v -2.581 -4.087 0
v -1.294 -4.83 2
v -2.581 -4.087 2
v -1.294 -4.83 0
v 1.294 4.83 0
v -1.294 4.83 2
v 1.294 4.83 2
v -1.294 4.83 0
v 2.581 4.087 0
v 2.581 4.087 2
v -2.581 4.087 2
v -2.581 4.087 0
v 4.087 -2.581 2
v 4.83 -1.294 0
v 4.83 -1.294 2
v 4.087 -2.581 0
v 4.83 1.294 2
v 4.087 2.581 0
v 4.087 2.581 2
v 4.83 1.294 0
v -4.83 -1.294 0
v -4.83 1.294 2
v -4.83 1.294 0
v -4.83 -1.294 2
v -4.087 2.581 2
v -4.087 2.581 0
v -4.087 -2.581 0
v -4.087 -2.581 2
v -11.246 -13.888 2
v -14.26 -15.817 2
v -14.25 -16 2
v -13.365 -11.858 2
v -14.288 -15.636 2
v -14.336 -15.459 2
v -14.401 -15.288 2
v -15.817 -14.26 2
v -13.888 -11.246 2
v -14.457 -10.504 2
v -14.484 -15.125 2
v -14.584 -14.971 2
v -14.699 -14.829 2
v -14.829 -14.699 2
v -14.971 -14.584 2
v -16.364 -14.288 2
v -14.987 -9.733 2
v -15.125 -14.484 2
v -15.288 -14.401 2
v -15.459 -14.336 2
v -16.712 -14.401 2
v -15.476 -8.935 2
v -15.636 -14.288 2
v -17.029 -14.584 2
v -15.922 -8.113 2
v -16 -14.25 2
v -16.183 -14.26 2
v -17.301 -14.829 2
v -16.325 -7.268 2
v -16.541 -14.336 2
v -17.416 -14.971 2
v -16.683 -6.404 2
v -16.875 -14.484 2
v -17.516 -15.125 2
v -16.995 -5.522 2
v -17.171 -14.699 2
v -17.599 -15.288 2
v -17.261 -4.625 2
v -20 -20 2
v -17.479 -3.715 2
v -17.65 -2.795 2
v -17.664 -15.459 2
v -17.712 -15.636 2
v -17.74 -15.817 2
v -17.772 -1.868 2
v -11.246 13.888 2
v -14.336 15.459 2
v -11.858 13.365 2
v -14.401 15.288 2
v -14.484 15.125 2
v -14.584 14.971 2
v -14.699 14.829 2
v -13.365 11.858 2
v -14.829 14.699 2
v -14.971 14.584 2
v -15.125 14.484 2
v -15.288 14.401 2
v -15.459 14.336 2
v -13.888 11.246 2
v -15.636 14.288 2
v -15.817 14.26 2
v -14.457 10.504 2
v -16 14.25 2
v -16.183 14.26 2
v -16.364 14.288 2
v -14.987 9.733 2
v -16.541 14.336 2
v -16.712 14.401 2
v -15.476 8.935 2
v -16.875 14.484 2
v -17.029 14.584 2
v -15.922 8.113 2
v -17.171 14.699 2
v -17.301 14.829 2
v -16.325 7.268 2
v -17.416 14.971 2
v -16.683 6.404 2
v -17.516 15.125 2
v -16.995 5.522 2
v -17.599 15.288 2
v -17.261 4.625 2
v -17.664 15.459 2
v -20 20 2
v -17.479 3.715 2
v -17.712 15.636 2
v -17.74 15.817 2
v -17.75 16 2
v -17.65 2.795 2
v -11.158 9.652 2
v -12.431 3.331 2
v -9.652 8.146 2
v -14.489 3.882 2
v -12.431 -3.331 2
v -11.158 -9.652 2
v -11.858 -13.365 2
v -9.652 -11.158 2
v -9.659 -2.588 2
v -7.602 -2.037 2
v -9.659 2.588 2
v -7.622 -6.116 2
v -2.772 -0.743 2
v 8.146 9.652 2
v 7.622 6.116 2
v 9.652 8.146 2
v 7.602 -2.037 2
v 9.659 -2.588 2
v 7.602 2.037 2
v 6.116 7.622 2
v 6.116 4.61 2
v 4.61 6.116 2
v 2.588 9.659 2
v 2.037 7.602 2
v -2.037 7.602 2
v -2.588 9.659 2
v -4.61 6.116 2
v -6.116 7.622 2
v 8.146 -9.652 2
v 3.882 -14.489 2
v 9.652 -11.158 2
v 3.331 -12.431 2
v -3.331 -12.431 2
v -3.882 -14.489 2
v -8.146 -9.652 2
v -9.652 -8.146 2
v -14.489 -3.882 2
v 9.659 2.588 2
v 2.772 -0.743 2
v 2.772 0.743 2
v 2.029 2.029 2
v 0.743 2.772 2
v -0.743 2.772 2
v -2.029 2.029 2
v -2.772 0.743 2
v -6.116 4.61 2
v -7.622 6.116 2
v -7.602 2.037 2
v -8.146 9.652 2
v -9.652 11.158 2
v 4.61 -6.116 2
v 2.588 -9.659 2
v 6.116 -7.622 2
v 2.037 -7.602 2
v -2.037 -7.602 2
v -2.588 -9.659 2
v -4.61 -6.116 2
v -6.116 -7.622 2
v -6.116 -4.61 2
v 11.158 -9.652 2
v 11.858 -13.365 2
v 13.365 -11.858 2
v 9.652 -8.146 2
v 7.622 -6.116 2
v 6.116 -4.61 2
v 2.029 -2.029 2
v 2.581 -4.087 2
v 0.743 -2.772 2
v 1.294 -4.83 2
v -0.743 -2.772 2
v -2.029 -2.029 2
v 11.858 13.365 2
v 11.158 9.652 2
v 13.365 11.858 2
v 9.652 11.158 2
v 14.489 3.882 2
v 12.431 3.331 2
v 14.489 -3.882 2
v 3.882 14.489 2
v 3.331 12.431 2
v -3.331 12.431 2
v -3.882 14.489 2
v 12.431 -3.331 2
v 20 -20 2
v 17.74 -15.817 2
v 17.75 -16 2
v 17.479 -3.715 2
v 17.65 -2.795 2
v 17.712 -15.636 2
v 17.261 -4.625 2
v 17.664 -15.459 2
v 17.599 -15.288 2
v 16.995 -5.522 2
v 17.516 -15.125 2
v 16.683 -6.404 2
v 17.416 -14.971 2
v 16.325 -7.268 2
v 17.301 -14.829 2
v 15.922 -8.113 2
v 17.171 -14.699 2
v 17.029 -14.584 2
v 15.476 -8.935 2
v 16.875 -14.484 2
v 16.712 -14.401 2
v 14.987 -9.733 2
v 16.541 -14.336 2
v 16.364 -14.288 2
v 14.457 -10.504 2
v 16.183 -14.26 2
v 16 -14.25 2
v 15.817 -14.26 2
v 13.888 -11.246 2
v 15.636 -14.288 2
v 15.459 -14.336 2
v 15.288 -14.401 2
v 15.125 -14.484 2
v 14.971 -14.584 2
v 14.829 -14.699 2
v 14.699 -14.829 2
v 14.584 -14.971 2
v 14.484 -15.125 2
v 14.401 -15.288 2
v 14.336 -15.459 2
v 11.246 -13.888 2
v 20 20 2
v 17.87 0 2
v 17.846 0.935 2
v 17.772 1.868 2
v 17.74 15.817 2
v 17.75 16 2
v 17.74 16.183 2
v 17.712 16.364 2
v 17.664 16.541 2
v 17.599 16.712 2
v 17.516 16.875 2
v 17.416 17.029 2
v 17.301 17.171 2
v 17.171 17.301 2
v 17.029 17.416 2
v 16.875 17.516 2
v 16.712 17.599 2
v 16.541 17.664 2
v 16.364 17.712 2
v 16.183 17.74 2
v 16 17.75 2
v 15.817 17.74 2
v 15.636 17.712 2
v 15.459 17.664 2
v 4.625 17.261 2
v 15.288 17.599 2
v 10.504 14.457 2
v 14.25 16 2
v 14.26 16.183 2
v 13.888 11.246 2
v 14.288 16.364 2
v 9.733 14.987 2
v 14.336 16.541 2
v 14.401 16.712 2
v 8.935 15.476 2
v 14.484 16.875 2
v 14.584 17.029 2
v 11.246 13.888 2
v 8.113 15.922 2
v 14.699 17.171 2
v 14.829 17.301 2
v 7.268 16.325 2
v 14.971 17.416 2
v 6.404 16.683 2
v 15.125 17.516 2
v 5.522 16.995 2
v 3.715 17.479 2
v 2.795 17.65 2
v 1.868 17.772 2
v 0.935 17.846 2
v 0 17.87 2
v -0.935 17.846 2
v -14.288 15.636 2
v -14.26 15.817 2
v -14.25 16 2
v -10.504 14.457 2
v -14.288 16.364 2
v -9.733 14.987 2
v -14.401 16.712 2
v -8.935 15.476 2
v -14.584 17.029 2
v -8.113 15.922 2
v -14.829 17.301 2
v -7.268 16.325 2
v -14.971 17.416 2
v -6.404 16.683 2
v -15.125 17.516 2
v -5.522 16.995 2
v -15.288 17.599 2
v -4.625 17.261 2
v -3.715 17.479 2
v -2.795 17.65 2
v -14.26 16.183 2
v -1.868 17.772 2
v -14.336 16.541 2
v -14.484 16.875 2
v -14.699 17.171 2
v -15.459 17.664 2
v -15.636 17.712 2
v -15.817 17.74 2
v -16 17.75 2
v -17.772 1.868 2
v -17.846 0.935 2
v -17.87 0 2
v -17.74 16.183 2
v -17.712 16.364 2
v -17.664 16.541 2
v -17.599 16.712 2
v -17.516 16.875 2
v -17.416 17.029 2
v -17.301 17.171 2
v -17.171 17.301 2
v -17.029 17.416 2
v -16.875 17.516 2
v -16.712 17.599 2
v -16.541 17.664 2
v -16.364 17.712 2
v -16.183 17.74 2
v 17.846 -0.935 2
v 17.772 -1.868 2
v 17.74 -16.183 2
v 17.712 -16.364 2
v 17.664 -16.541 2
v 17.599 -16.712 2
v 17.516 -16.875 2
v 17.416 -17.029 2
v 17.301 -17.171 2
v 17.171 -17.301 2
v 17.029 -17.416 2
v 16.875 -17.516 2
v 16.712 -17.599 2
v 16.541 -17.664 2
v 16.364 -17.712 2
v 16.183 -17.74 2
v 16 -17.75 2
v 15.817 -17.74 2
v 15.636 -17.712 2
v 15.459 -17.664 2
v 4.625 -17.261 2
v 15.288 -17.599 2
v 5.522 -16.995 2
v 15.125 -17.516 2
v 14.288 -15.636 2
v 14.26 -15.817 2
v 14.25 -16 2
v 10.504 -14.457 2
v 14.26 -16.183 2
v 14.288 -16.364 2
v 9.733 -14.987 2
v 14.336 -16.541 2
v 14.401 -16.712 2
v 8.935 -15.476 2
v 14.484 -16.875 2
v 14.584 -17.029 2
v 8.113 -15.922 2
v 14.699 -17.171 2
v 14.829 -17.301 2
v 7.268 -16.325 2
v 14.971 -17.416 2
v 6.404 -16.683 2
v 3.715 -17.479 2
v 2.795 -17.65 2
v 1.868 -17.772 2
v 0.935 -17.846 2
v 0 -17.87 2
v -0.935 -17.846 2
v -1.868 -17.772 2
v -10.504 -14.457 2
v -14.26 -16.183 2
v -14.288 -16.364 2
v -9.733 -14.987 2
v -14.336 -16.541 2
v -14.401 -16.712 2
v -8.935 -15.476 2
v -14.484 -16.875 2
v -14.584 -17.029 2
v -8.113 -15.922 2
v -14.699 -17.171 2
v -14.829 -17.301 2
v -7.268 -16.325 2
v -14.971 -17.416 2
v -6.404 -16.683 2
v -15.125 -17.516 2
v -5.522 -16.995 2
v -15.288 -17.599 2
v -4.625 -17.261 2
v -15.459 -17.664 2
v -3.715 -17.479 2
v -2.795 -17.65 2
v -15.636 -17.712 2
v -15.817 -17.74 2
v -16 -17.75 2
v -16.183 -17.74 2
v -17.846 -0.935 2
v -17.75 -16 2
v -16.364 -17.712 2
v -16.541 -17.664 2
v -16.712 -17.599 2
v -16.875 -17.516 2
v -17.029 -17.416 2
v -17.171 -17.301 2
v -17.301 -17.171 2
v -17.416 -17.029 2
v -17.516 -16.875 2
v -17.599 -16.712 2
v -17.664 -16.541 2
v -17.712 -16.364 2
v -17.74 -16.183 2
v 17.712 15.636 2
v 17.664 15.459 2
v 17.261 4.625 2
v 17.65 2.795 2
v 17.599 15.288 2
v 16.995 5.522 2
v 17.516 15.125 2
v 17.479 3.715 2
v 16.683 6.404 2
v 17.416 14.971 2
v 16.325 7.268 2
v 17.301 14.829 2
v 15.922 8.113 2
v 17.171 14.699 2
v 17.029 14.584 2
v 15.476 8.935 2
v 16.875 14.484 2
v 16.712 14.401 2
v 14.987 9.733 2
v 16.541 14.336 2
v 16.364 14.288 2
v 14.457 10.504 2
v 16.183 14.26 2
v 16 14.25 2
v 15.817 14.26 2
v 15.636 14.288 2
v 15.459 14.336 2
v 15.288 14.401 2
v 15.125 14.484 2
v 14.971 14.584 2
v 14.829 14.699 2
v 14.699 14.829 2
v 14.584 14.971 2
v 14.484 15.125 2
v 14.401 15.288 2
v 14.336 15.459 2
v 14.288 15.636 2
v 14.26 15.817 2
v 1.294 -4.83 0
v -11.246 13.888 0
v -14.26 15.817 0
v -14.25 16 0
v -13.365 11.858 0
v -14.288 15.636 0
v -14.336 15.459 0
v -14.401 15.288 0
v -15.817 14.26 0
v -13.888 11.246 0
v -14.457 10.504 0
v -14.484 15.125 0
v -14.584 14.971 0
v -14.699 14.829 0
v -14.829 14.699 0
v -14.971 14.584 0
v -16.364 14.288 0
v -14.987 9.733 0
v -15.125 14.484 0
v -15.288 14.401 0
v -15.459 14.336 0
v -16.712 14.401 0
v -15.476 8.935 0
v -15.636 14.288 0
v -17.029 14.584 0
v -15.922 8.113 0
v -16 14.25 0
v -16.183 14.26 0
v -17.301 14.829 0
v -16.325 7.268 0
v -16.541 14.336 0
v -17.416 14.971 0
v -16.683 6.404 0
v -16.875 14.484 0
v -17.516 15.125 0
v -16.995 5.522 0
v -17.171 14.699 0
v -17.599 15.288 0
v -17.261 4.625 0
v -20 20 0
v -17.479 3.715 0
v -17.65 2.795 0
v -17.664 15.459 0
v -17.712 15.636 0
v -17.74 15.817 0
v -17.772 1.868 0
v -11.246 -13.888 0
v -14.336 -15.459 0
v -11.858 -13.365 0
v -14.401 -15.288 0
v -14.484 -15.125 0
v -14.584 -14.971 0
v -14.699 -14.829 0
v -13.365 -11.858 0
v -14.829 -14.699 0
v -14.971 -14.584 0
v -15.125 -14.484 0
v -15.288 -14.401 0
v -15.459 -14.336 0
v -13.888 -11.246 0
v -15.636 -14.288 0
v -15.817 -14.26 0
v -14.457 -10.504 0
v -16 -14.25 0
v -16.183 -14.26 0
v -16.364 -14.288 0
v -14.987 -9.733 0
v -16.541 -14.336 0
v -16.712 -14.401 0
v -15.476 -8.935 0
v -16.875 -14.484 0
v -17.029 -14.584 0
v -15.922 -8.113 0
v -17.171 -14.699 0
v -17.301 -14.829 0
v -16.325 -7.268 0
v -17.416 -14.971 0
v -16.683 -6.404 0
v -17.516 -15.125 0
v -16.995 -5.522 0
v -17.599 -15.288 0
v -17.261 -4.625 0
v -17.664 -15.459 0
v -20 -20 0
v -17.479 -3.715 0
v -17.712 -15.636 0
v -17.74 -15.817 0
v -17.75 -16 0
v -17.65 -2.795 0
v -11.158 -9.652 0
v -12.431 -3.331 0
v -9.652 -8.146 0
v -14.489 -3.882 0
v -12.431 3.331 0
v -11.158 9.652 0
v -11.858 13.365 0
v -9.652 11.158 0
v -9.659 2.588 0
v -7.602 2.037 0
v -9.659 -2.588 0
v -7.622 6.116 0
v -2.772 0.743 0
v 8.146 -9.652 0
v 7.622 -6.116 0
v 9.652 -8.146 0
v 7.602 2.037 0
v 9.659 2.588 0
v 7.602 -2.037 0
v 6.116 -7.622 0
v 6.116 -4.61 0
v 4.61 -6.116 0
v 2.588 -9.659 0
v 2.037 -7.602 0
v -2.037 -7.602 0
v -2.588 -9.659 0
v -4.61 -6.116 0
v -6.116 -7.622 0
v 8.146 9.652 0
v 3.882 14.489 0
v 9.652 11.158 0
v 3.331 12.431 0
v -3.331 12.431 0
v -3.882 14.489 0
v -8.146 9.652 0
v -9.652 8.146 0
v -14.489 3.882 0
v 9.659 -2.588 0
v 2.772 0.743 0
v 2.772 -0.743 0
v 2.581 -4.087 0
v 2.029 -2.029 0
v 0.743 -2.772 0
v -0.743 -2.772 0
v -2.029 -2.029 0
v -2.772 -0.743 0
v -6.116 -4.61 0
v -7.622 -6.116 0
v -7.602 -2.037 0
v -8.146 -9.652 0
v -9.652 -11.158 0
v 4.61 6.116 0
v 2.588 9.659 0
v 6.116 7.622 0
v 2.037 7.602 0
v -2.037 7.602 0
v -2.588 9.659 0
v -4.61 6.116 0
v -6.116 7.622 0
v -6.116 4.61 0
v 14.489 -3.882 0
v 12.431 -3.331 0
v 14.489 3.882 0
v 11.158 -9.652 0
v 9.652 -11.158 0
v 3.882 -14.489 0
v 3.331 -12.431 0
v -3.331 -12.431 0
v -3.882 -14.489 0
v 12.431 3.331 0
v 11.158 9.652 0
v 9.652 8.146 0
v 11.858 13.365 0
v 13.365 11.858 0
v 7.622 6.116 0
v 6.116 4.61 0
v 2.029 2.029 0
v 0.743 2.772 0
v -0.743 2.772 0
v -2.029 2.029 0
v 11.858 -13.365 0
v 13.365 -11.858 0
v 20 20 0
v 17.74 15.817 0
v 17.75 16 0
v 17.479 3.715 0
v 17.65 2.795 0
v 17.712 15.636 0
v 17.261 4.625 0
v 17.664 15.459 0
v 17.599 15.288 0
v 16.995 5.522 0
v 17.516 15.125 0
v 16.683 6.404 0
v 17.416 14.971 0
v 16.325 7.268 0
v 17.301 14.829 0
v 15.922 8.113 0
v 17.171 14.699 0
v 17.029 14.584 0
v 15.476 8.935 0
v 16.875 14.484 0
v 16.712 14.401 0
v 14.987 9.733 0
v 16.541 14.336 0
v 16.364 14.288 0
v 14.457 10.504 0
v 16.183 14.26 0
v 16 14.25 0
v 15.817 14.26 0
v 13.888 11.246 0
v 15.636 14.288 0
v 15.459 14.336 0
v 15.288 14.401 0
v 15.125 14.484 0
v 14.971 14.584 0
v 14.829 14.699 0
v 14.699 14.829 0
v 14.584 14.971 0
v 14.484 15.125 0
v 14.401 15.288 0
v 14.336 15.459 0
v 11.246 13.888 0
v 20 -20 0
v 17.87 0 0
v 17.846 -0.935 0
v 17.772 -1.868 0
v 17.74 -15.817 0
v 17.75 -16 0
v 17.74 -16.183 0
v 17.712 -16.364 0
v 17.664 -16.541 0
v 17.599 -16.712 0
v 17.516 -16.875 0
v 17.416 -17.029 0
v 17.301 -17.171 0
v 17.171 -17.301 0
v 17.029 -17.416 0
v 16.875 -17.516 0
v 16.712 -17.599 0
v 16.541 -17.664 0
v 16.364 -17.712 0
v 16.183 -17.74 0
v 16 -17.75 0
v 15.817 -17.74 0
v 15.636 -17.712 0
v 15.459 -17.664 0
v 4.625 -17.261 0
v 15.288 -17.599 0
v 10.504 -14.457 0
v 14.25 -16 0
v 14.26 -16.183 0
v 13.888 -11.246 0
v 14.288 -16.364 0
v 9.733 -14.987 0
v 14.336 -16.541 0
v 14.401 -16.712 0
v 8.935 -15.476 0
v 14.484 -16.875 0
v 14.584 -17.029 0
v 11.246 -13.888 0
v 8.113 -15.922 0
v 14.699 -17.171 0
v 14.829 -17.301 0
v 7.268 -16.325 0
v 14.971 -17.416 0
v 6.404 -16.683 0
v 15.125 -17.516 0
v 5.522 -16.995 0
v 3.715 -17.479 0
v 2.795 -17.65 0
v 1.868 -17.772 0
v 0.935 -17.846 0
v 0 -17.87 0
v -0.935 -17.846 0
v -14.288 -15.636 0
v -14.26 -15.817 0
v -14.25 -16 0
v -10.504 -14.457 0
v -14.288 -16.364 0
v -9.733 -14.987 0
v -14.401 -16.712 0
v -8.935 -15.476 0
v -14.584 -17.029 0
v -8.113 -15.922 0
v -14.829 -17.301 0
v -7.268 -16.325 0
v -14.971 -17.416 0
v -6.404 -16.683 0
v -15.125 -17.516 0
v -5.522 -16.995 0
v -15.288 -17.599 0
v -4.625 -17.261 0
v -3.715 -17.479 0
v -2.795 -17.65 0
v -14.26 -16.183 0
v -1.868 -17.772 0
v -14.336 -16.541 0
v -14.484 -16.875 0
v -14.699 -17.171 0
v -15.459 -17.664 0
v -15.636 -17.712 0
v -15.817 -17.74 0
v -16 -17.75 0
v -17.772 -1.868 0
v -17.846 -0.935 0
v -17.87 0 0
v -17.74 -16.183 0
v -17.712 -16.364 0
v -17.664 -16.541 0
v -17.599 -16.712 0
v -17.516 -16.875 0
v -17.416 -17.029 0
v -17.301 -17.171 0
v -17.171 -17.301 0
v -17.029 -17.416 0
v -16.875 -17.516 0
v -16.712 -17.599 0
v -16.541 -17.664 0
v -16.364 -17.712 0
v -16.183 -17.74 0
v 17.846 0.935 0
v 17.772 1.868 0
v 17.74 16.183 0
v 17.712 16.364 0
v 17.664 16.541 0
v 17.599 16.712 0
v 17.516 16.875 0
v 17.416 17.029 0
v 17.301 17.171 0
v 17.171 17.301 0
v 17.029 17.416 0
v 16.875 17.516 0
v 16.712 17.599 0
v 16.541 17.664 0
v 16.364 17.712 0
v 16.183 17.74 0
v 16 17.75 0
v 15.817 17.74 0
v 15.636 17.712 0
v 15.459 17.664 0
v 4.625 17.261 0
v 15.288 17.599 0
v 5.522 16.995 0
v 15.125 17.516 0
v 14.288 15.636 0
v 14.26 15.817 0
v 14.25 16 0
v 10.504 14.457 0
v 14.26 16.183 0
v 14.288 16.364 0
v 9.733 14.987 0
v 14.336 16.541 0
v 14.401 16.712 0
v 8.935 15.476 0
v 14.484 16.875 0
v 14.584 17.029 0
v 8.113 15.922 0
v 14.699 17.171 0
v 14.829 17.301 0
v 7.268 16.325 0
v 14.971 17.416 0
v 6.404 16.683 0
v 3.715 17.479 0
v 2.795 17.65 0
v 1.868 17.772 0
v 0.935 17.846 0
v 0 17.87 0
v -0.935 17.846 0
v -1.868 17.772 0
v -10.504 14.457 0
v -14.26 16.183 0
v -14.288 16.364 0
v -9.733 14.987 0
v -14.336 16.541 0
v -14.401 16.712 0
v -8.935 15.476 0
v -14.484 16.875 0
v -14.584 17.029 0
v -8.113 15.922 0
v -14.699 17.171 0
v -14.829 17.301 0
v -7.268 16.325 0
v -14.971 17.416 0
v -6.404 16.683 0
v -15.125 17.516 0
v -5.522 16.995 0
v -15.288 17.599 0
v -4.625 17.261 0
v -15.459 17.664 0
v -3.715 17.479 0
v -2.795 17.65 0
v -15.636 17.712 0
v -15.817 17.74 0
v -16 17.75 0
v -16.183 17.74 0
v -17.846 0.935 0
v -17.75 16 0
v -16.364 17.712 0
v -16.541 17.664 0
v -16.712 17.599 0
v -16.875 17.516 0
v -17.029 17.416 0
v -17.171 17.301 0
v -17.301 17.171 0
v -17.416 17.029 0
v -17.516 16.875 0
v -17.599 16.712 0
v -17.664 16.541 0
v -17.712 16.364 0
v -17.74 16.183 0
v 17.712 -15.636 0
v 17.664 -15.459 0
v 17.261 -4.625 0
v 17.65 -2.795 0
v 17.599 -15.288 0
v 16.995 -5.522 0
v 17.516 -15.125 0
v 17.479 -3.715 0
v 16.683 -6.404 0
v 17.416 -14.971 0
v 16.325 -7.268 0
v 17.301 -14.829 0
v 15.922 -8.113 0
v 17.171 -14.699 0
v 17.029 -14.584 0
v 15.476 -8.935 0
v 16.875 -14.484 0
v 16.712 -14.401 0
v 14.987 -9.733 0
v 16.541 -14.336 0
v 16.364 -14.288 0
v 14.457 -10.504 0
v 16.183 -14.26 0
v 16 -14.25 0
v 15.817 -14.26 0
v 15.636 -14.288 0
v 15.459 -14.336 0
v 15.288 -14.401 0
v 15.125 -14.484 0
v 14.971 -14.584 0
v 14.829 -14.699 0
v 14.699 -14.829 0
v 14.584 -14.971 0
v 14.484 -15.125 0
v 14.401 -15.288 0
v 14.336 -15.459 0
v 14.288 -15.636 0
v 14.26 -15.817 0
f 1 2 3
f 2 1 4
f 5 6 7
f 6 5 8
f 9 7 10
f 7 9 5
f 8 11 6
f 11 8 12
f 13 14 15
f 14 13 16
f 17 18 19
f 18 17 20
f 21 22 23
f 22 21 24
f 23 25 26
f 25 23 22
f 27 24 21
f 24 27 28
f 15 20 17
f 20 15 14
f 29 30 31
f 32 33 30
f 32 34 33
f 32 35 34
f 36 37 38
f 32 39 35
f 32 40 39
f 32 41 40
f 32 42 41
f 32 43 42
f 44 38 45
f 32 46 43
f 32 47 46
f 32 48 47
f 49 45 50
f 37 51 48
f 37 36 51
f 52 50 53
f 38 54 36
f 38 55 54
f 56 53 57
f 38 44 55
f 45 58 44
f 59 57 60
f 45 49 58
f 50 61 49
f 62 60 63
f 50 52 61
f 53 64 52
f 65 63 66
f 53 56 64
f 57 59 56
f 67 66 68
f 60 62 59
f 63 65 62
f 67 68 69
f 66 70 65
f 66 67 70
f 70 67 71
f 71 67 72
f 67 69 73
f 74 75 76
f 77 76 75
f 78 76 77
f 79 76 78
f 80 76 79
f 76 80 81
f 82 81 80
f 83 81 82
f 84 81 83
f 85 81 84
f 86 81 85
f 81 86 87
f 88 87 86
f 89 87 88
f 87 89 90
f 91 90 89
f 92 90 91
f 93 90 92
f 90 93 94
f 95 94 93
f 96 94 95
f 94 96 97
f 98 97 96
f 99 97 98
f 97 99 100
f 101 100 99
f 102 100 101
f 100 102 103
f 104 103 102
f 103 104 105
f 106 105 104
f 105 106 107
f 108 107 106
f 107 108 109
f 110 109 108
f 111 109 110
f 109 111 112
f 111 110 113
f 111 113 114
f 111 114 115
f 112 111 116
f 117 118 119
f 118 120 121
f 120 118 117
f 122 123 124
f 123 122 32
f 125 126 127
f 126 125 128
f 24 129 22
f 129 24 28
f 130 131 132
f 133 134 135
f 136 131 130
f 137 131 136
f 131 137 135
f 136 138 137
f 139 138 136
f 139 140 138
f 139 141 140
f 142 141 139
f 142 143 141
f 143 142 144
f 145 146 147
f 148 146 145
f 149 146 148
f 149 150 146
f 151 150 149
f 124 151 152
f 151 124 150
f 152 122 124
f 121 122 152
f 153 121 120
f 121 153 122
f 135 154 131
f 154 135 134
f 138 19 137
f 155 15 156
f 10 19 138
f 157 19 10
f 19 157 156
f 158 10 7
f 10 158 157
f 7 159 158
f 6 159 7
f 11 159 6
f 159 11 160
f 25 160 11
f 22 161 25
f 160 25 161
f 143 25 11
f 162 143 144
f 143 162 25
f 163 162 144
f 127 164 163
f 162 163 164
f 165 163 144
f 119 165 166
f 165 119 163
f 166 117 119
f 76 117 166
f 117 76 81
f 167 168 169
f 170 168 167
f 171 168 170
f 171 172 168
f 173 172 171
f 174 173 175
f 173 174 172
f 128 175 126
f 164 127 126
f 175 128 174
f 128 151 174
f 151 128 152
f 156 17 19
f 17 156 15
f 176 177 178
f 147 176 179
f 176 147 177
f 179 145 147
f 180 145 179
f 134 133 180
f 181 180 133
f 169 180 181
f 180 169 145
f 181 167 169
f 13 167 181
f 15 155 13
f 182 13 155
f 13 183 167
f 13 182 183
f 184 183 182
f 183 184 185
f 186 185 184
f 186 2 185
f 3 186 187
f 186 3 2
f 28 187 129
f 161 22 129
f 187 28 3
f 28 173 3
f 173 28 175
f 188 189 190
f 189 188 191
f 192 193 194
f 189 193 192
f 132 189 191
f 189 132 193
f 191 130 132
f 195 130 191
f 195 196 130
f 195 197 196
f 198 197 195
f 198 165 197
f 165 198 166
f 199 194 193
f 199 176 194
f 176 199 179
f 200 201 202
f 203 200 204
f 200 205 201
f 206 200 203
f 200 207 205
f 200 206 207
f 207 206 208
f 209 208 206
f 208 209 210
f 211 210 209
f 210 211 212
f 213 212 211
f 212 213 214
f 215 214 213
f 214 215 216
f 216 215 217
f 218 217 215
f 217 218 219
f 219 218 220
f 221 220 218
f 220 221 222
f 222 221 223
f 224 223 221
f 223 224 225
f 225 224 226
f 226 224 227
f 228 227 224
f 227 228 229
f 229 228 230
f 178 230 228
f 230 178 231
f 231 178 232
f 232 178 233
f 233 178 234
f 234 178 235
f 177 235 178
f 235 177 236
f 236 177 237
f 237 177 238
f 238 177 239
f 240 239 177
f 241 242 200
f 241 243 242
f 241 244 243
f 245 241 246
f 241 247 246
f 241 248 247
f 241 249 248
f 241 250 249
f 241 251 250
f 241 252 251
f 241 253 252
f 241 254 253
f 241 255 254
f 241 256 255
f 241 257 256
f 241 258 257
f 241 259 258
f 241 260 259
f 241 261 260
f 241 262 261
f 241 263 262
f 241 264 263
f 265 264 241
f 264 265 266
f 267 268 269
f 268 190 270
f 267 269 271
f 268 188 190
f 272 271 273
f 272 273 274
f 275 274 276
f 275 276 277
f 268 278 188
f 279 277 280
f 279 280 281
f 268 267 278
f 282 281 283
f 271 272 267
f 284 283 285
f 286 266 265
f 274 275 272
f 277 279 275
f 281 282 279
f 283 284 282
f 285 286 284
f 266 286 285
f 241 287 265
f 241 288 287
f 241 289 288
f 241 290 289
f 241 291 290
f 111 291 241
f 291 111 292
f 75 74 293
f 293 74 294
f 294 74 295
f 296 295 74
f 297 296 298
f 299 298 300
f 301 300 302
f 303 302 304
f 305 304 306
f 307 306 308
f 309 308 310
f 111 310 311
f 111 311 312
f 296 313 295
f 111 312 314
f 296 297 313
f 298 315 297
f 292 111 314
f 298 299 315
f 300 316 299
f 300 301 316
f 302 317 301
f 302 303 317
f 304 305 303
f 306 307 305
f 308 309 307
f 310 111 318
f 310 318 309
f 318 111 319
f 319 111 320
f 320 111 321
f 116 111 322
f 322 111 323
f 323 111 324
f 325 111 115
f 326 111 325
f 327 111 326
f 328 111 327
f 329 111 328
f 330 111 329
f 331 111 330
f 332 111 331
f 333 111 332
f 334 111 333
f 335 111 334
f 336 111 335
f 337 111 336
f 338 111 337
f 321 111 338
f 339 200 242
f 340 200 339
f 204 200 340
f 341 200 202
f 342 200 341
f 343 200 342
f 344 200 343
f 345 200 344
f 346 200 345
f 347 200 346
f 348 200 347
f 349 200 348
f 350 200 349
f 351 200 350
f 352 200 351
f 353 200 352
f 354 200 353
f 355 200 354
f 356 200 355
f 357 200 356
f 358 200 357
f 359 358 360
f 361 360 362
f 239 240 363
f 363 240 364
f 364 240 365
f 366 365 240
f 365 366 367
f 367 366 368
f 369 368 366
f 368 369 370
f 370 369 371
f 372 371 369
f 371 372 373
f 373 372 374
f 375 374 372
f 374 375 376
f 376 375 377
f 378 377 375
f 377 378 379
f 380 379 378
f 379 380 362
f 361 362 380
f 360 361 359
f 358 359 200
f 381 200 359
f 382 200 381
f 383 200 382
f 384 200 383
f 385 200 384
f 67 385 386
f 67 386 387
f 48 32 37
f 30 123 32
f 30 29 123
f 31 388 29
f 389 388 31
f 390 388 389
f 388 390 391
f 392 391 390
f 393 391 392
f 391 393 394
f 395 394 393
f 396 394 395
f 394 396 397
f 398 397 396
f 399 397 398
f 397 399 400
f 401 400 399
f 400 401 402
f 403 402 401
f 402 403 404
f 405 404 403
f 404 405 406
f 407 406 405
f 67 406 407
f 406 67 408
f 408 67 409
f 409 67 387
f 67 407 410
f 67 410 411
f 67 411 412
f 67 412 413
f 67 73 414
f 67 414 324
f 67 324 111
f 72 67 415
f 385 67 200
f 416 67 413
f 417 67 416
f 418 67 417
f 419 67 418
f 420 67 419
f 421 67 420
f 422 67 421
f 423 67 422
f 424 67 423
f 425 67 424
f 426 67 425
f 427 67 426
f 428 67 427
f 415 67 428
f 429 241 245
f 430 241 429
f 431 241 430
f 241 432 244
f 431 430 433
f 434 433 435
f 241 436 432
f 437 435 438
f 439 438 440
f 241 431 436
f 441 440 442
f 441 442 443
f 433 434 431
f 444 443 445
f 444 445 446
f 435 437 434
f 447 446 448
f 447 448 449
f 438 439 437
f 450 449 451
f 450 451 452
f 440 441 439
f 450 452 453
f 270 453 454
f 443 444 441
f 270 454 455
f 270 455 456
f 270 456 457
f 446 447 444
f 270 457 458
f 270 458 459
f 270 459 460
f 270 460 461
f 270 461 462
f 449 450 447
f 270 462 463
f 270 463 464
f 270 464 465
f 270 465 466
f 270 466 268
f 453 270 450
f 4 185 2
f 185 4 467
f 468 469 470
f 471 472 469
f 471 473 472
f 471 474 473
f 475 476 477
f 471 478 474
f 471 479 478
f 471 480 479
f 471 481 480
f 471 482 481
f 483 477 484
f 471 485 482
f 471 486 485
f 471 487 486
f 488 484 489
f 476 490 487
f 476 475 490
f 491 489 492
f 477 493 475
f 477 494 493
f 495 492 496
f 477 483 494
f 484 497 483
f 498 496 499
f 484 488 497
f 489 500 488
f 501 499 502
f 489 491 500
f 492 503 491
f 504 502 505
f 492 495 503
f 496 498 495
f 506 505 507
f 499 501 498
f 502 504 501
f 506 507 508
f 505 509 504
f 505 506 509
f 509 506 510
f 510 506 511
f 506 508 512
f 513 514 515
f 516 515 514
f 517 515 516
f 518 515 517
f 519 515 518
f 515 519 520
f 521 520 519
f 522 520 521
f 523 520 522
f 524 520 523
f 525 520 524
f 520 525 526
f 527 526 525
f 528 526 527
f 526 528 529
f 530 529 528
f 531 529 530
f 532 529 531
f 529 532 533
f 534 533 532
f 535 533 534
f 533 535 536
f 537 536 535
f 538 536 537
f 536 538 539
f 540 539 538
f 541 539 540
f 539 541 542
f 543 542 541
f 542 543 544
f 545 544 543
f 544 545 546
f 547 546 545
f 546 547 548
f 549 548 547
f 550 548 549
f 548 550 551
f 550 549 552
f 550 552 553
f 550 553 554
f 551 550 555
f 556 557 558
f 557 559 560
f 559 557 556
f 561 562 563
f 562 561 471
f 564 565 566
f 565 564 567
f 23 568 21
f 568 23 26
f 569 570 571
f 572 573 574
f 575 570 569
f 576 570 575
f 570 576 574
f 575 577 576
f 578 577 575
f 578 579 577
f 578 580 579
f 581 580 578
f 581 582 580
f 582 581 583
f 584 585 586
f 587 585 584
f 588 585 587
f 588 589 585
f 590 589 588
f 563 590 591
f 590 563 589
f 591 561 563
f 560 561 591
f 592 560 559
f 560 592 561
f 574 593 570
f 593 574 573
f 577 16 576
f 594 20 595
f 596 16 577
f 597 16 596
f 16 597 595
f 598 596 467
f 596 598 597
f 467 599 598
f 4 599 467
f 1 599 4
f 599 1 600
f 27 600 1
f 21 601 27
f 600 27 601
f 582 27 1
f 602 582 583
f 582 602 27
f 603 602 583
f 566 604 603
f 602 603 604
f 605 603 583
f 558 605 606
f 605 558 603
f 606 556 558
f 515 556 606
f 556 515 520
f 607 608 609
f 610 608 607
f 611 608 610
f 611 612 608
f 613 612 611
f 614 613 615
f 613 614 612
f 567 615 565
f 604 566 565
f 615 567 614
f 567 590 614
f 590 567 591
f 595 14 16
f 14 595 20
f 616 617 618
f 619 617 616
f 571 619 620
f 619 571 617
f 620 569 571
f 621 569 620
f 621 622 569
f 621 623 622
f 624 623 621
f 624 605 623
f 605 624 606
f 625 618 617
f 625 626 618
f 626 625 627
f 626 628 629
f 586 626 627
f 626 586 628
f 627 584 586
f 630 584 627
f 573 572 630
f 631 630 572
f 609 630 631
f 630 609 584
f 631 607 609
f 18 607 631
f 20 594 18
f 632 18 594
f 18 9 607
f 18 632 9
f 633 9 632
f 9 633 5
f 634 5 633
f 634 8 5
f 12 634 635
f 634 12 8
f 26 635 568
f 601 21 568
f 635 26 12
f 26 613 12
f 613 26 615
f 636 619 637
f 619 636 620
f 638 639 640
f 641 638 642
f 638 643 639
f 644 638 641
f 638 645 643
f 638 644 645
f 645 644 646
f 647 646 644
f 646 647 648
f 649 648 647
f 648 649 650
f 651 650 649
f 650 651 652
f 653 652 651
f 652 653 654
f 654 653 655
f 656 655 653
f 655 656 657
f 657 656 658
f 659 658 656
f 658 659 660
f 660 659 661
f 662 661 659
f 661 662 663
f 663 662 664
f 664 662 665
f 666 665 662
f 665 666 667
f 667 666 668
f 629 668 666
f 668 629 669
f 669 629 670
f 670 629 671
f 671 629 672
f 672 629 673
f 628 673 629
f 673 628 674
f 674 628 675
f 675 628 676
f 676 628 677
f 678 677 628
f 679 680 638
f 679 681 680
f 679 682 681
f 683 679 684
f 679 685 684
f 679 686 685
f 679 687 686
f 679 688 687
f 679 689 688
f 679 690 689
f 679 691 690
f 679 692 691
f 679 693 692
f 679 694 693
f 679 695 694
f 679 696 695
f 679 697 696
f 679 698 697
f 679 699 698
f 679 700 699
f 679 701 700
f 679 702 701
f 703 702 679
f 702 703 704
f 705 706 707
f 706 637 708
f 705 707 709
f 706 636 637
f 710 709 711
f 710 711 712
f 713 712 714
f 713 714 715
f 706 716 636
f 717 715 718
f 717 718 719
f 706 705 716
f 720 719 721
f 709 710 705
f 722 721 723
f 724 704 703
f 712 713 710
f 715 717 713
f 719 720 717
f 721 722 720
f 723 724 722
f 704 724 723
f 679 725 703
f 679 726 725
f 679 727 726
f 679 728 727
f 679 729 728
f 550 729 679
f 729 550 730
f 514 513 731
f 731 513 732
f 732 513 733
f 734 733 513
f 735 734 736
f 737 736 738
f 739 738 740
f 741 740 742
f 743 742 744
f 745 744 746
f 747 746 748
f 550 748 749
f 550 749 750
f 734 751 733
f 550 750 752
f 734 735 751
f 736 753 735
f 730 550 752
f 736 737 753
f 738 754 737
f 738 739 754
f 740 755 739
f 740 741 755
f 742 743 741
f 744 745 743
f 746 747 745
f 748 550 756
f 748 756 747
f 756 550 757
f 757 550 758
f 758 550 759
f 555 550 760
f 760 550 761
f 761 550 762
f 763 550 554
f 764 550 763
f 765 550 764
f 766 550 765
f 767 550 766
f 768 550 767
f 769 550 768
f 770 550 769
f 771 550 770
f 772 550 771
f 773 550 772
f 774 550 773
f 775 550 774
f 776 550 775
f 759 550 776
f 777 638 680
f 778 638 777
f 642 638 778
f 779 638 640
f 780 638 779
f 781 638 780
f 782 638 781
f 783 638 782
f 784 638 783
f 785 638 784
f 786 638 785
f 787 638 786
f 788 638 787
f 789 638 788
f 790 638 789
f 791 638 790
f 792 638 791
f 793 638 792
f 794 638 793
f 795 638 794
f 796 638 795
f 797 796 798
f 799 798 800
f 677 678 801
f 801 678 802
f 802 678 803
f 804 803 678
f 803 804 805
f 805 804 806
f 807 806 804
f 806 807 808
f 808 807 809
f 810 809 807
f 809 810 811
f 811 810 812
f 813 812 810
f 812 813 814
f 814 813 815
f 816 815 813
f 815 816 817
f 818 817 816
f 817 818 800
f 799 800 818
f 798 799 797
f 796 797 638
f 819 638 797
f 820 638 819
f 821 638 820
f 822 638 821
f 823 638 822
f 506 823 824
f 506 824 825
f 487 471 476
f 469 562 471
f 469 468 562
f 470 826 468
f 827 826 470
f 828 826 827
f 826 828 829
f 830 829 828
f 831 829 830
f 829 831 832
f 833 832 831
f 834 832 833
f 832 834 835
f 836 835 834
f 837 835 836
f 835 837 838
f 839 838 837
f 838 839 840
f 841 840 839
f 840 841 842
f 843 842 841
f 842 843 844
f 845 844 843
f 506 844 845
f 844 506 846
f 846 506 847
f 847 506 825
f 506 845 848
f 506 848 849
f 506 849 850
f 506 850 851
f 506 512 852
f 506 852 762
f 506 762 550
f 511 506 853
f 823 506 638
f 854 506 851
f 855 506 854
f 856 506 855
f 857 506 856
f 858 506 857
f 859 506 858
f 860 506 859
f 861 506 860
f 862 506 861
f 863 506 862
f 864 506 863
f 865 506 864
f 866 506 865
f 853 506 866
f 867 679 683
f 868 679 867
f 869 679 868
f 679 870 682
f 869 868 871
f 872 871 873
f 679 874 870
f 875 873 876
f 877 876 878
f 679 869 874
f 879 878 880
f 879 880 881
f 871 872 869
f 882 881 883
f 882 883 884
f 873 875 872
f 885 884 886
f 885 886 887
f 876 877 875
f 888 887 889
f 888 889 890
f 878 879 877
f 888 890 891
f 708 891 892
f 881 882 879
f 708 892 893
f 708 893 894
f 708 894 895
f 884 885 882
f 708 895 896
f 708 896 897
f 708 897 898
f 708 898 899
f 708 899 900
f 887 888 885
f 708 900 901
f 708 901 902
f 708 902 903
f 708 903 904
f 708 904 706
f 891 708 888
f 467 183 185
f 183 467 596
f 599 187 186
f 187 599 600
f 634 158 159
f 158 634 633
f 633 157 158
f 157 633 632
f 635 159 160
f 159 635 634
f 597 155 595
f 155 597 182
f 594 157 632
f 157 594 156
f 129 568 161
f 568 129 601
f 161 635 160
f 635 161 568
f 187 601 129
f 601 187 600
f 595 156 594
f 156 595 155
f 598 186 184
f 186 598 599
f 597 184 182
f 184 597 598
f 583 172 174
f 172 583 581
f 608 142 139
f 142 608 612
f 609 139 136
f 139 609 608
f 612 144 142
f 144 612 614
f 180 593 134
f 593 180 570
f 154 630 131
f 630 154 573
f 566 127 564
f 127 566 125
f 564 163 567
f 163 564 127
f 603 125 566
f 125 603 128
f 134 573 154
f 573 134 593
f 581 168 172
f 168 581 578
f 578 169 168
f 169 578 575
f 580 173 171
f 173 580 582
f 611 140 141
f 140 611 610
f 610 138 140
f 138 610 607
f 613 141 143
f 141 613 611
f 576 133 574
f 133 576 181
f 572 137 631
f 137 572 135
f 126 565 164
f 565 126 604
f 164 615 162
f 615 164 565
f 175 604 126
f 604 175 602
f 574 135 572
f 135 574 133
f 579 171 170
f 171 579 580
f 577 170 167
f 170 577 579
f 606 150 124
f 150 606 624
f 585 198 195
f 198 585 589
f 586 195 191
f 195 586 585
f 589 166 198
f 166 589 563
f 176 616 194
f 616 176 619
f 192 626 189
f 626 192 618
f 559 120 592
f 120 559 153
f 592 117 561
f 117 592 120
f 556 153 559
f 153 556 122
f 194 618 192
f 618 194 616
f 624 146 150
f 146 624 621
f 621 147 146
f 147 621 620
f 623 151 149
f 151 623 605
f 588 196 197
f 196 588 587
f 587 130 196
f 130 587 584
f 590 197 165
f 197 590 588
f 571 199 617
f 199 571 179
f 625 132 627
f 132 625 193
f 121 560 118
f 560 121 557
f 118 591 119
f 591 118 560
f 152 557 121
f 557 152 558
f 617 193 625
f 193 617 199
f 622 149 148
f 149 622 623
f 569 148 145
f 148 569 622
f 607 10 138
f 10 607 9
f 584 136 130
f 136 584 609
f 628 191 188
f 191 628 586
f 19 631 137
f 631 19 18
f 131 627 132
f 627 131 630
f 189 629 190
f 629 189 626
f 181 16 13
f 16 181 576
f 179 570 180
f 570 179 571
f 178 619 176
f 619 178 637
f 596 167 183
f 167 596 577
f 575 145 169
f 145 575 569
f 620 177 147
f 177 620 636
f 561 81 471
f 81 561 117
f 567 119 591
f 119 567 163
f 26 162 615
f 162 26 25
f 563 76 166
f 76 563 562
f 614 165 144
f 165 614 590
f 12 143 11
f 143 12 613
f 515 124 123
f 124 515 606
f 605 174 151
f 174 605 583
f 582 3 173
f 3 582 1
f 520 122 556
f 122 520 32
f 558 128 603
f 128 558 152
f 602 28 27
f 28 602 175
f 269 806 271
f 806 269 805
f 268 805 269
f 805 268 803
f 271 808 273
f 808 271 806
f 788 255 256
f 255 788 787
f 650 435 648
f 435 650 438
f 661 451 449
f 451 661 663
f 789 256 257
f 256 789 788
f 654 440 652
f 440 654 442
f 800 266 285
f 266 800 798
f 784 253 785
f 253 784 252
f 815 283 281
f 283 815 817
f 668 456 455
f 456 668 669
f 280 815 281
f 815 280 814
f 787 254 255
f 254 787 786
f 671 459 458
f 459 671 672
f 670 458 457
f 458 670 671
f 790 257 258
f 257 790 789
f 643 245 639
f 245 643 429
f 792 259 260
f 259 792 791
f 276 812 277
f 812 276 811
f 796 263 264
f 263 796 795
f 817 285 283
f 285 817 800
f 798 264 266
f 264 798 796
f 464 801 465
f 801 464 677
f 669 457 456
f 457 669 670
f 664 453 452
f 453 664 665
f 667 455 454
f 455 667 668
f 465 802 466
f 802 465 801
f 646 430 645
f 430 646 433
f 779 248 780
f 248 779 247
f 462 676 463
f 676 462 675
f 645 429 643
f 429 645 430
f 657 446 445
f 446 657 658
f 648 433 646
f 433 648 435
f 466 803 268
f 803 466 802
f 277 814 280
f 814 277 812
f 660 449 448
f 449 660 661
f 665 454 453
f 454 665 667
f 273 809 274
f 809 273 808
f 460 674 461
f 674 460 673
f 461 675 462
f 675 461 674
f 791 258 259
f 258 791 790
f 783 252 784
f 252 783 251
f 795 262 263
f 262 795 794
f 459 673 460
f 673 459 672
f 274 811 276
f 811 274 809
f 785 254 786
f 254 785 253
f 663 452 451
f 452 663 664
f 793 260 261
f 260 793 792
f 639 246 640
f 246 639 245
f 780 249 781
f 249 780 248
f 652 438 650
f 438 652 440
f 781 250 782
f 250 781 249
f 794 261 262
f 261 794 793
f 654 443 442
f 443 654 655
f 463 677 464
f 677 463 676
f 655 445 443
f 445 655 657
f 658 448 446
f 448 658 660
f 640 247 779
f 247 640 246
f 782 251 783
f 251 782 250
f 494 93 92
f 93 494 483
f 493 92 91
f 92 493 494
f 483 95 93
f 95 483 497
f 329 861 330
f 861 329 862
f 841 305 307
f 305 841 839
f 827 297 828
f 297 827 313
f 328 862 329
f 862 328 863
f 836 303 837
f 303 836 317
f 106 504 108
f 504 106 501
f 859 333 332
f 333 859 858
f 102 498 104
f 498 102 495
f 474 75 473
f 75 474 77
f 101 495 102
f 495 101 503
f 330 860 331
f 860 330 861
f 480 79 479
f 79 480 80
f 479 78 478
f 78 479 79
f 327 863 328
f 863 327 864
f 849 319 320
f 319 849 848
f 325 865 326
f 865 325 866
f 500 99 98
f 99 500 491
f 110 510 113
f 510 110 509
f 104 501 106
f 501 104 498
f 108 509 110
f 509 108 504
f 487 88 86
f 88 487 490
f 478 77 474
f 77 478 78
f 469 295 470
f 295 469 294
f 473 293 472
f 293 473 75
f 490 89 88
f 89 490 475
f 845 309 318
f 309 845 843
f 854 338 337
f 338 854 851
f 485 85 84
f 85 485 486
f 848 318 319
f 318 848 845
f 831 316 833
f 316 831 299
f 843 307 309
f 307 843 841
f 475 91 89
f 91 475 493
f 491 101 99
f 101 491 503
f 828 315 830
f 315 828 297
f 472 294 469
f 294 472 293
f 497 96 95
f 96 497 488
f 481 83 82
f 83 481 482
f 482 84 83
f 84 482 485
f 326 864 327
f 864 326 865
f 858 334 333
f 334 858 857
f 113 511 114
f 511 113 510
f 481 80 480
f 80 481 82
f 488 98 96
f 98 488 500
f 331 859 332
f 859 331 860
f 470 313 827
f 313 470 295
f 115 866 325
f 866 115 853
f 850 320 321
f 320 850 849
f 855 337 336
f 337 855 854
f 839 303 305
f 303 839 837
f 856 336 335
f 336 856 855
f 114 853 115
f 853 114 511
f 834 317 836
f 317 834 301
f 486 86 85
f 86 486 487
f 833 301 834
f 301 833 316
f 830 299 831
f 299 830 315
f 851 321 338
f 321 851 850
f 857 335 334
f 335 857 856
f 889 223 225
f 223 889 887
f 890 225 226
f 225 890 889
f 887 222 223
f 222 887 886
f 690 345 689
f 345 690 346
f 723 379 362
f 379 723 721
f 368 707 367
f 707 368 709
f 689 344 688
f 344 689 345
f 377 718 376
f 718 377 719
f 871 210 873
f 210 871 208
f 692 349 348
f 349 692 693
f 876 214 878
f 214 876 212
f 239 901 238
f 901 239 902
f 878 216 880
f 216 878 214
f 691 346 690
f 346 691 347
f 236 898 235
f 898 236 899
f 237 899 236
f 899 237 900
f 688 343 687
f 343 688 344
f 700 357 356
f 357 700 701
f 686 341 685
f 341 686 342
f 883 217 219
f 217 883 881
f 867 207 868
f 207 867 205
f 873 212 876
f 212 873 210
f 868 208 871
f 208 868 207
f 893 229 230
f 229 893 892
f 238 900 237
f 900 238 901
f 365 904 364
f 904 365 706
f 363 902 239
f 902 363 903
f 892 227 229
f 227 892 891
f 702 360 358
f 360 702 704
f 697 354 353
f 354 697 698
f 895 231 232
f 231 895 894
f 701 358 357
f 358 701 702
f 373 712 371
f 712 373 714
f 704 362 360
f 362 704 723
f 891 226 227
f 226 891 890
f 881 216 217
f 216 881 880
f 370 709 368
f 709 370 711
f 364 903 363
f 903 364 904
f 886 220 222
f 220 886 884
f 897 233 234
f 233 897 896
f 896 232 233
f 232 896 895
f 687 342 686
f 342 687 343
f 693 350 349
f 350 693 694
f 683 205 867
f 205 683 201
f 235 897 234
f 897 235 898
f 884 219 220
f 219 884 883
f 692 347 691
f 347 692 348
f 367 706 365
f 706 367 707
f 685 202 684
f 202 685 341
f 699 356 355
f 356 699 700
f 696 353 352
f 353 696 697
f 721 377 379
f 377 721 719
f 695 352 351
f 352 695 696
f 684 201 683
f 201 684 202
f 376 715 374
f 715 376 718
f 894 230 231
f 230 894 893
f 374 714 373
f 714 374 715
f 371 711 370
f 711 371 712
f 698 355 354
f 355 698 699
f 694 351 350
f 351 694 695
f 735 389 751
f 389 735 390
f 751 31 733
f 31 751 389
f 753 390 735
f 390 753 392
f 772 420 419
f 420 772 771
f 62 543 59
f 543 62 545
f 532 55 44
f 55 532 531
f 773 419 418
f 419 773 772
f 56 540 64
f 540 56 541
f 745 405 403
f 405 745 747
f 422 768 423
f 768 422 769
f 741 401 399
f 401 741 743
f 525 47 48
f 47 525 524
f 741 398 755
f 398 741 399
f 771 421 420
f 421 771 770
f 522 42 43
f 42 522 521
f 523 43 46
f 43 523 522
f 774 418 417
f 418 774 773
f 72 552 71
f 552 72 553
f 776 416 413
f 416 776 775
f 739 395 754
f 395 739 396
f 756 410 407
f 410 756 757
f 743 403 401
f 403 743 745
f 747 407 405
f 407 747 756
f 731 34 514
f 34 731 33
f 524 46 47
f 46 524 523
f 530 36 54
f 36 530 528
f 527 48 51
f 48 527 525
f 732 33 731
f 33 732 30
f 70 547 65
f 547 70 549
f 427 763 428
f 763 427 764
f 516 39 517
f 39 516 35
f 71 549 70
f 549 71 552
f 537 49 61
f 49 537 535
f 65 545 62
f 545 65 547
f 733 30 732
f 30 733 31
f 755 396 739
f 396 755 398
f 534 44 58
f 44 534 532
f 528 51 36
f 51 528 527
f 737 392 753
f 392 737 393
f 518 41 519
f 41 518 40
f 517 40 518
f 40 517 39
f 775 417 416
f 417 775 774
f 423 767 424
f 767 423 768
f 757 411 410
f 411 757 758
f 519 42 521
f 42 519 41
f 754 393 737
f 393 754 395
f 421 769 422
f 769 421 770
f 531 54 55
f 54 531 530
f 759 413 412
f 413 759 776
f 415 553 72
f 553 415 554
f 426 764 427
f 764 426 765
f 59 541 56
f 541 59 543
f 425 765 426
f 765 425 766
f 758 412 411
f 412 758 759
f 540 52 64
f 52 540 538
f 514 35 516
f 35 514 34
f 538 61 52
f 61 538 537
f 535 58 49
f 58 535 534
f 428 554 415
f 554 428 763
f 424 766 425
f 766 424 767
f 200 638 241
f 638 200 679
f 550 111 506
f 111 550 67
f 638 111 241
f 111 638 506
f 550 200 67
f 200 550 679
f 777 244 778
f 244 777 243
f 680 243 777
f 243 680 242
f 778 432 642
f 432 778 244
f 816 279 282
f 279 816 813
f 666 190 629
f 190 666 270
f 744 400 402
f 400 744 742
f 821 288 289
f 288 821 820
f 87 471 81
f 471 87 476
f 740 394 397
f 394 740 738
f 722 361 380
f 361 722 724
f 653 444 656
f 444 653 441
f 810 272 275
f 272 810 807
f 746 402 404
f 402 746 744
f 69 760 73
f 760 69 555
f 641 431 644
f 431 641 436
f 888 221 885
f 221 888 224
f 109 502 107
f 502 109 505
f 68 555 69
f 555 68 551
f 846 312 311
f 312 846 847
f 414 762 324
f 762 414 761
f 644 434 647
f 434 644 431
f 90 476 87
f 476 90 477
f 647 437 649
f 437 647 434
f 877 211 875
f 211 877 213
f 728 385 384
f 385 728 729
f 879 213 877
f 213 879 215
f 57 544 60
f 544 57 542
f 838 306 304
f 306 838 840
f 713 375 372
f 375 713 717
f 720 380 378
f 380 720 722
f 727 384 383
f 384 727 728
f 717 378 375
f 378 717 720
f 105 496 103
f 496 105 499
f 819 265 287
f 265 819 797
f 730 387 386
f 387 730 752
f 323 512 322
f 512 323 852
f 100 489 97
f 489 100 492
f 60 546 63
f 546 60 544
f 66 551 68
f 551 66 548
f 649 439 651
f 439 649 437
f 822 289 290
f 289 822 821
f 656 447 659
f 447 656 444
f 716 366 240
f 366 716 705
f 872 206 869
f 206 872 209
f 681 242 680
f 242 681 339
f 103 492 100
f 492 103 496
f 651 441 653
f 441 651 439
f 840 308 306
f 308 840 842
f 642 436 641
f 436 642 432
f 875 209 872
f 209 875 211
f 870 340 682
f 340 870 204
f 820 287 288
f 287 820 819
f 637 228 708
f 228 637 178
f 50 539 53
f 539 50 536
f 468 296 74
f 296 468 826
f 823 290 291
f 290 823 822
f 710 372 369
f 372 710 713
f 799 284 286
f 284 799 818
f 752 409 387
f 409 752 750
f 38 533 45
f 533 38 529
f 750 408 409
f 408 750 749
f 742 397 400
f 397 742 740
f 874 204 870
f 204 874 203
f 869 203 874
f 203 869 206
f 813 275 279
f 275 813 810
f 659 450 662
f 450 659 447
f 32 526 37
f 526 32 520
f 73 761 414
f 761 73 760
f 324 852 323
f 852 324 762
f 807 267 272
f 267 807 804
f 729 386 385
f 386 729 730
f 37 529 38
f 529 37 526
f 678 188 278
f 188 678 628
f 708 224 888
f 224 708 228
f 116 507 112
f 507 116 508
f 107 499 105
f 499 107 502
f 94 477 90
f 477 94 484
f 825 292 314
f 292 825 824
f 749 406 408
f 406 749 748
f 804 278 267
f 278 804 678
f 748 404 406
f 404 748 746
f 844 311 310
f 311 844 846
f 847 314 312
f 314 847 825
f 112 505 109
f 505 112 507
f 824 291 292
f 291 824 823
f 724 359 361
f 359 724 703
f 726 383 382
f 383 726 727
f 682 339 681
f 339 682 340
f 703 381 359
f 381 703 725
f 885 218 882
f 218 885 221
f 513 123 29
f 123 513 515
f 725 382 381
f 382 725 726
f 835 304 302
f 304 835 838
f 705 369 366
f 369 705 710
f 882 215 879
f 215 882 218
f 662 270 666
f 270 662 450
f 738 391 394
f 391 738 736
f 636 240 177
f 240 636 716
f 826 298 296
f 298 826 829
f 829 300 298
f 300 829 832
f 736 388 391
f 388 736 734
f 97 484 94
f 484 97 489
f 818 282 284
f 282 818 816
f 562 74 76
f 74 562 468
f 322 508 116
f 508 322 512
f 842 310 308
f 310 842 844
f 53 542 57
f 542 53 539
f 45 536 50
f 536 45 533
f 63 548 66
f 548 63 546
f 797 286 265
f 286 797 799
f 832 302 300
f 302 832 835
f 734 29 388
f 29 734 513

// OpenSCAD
/*
 *      Customazable fan grill.
 *	
 * Copyright (C) 2013 Mikhail Basov <RepRap[at]Basov[dot]net>
 *
 * This program is free software; you can redistribute it and/or modify
 * it under the terms of the GNU General Public License as published by
 * the Free Software Foundation; either version 3 of the License,
 * LGPL version 2.1, or (at your option) any later version of the GPL.
 *
 * This program is distributed in the hope that it will be useful,
 * but WITHOUT ANY WARRANTY; without even the implied warranty of
 * MERCHANTABILITY or FITNESS FOR A PARTICULAR PURPOSE. See the
 * GNU General Public License for more details.
 *
 * You should have received a copy of the GNU General Public License
 * along with this program; if not, write to the Free Software
 * Foundation, Inc., 59 Temple Place, Suite 330, Boston, MA 02111-1307 USA
 *
 *		2013. License, GPL v2 or later
 */

/* Start of customizer header */

module tear_drop_fan_grill() {
  
  /* [Grill] */
  
  // Number of rings
  Number_of_rings=3; // [1:15]
  
  // Smooth ring or segments
  Ring_or_segment=0; //[0:Segment,1:Ring]
  
  Drop_or_ring=0;    //[0:Ring,1:TearDrop]
  
  Solid_center=0;    //[1:Solid,0:Hole]
  
  /* [Dimemsions] */
  
  External_dimension=40;
  
  Rods_and_rings_wide=2.13;
  
  /* [Mount] */
  
  Distance_between_mounting_holes=32;
  
  Mounting_screw_thread_diameter=3.5;
  
  // To make cylindrical mount holes set this parameter same as Mounting Screw Thread Diameter.
  Head_diameter_mounting_screw=3.5;
  
  Height_of_the_cone_mounting_screw=1.9;
  
  // Height Of The Cone Mounting Screw plus 0.5 mm recommended
  Thickness_of_the_plate=2;
  
  // preview[view:south west, tilt:top]
  
  /* [Hidden] */
  /* End of customizer header */
  
  size=External_dimension;
  mount=Distance_between_mounting_holes;
  m_od=Head_diameter_mounting_screw;
  m_id=Mounting_screw_thread_diameter;
  m_h=Height_of_the_cone_mounting_screw;       
  g_wide=Rods_and_rings_wide;   
  thick=Thickness_of_the_plate;
  
  /*
      Grill parameters
  */
  num=Number_of_rings;         // number of tear drop rings
  smooth=Ring_or_segment;   // tear drop rings smooth 
  tear_drop=Drop_or_ring;// tear drop or simple ring
  s_center=Solid_center; //make center solid
  
  /* 
      120 mm fan dimensions 
  size=120;      // external dimension
  mount=104.6;   // distance between centers of 
                 // mounting holes on one side of
  m_od=6.5;      // outer diameter of the screw head
  m_id=4.8;      // thread diameter mounting screw
  m_h=1.9;       // mount screw height of the cone 
  g_wide=2.13;   // 0.37 - extrusion wide, 
                 // 0.354 - extrusion distance
                 // 6 - number of threads in two perimeters
                 // 0.37*(1+(0.354/0.37)*(6-1))=
                 //  =2.13999999999999999998
  thick=m_h+0.5; // 0.5 is height of 1-st and second layer
  */
  
  /* 
      20 mm fan dimensions !!! EARLY DRAFT !!!
  size=20;       // external dimension
  mount=15;      // distance between centers of 
                 // mounting holes on one side of
  m_od=1.5;      // outer diameter of the screw head
  m_id=0.8;      // thread diameter mounting screw
  m_h=0.4;       // mount screw height of the cone 
  g_wide=1.078;  // 0.37 - extrusion wide, 
                 // 0.354 - extrusion distance
                 // 3 - number of threads in one perimeter
                 // 0.37*(1+(0.354/0.37)*(3-1))=
                 //  =1.07799999999999999999
  thick=m_h+0.5; // 0.5 is height of 1-st and second layer
  */
  
  
  // calculated constants
  step=size/(num+1);
  id=size-(g_wide*2);
  sq2=sqrt(2);
  
  // variables initialization
  small_road=0;
  large_i_drop=0;
  
  // modules
  module tear_drop(r=10, h=2, s=true){
    union(){
      if(s){
        s_fact=120;
          cylinder(r=r,h=h,$fn=s_fact);
      } else {
          s_fact=12;
          cylinder(r=r,h=h,$fn=s_fact);
      }
      if(tear_drop)
        cube([r,r,h]);
    }
  }
  
  module tear_drop_ring(od=10,t=1,h=2,sm=true,so=false){
    difference(){
      tear_drop(r=od/2,h=h,s=sm);
      if(so){
      }else{
        translate([0,0,-0.5])
          tear_drop(r=od/2-t,h=h+1,s=sm);
      }
    }
  }
  
  module mount_hole(d_l,d_s,deep,h)
  {
    rotate([0,180,0]){
     cylinder(r=d_s/2,h=h+0.1,$fn=60);
     cylinder(r1=d_l/2,r2=d_s/2,h=deep,$fn=60);
    }
  }
  
  // grill
  intersection(){
    rotate([0,0,45])
      union(){
        for ( n = [step:step:size-step] ) {
          if(n==step){
            if(s_center){
              tear_drop_ring(od=n,t=g_wide,h=thick,sm=smooth,so=s_center);
            }else{
              tear_drop_ring(od=n,t=g_wide,h=thick,sm=smooth);
            }
          }else{
            tear_drop_ring(od=n,t=g_wide,h=thick,sm=smooth);
          }
          // small rod for largest free tear drop
          if(tear_drop){
            if((size)-(sq2*n)>0){
              if((size)-(sq2*n)<sq2*step){
                //generate small rod
                rotate([0,0,45])
                  translate([sq2*(n/2-g_wide),-g_wide/2,0])
                    cube([(size/2-sq2*(n/2-g_wide)),g_wide,thick]);
              }
            }
          }
        }
  
      }
      // cut tear drop ring outside plate 
      translate([-size/2,-size/2,0])
        cube([size,size,thick]);
  }
  
  // rods
  for(a=[45,-45,135,-135]){
    rotate([0,0,a])
      translate([step/2-g_wide,-g_wide/2,0])
        cube([(size/2-step/2+0.01),g_wide,thick]);
  }
  
  // main plate
  difference(){
    // plate
    translate([0,0,thick/2])
      cube([size,size,thick],center=true);
    translate([0,0,-0.5])
      cylinder(r=id/2,h=thick+1,$fn=120);
    // mount holes and round corners
    for(a=[0,90,-90,180]){
      rotate([0,0,a]){
        translate([mount/2,mount/2,-0.5])
          difference(){
//            cube([(size-mount)/2+0.1,(size-mount)/2+0.1,thick+1]);
//            cylinder(r=(size-mount)/2,h=thick+1,$fn=60);
          }
        translate([mount/2,mount/2,thick+0.01])
          mount_hole(m_od,m_id,m_h,thick);
      }
    }
  }
}  

tear_drop_fan_grill();
